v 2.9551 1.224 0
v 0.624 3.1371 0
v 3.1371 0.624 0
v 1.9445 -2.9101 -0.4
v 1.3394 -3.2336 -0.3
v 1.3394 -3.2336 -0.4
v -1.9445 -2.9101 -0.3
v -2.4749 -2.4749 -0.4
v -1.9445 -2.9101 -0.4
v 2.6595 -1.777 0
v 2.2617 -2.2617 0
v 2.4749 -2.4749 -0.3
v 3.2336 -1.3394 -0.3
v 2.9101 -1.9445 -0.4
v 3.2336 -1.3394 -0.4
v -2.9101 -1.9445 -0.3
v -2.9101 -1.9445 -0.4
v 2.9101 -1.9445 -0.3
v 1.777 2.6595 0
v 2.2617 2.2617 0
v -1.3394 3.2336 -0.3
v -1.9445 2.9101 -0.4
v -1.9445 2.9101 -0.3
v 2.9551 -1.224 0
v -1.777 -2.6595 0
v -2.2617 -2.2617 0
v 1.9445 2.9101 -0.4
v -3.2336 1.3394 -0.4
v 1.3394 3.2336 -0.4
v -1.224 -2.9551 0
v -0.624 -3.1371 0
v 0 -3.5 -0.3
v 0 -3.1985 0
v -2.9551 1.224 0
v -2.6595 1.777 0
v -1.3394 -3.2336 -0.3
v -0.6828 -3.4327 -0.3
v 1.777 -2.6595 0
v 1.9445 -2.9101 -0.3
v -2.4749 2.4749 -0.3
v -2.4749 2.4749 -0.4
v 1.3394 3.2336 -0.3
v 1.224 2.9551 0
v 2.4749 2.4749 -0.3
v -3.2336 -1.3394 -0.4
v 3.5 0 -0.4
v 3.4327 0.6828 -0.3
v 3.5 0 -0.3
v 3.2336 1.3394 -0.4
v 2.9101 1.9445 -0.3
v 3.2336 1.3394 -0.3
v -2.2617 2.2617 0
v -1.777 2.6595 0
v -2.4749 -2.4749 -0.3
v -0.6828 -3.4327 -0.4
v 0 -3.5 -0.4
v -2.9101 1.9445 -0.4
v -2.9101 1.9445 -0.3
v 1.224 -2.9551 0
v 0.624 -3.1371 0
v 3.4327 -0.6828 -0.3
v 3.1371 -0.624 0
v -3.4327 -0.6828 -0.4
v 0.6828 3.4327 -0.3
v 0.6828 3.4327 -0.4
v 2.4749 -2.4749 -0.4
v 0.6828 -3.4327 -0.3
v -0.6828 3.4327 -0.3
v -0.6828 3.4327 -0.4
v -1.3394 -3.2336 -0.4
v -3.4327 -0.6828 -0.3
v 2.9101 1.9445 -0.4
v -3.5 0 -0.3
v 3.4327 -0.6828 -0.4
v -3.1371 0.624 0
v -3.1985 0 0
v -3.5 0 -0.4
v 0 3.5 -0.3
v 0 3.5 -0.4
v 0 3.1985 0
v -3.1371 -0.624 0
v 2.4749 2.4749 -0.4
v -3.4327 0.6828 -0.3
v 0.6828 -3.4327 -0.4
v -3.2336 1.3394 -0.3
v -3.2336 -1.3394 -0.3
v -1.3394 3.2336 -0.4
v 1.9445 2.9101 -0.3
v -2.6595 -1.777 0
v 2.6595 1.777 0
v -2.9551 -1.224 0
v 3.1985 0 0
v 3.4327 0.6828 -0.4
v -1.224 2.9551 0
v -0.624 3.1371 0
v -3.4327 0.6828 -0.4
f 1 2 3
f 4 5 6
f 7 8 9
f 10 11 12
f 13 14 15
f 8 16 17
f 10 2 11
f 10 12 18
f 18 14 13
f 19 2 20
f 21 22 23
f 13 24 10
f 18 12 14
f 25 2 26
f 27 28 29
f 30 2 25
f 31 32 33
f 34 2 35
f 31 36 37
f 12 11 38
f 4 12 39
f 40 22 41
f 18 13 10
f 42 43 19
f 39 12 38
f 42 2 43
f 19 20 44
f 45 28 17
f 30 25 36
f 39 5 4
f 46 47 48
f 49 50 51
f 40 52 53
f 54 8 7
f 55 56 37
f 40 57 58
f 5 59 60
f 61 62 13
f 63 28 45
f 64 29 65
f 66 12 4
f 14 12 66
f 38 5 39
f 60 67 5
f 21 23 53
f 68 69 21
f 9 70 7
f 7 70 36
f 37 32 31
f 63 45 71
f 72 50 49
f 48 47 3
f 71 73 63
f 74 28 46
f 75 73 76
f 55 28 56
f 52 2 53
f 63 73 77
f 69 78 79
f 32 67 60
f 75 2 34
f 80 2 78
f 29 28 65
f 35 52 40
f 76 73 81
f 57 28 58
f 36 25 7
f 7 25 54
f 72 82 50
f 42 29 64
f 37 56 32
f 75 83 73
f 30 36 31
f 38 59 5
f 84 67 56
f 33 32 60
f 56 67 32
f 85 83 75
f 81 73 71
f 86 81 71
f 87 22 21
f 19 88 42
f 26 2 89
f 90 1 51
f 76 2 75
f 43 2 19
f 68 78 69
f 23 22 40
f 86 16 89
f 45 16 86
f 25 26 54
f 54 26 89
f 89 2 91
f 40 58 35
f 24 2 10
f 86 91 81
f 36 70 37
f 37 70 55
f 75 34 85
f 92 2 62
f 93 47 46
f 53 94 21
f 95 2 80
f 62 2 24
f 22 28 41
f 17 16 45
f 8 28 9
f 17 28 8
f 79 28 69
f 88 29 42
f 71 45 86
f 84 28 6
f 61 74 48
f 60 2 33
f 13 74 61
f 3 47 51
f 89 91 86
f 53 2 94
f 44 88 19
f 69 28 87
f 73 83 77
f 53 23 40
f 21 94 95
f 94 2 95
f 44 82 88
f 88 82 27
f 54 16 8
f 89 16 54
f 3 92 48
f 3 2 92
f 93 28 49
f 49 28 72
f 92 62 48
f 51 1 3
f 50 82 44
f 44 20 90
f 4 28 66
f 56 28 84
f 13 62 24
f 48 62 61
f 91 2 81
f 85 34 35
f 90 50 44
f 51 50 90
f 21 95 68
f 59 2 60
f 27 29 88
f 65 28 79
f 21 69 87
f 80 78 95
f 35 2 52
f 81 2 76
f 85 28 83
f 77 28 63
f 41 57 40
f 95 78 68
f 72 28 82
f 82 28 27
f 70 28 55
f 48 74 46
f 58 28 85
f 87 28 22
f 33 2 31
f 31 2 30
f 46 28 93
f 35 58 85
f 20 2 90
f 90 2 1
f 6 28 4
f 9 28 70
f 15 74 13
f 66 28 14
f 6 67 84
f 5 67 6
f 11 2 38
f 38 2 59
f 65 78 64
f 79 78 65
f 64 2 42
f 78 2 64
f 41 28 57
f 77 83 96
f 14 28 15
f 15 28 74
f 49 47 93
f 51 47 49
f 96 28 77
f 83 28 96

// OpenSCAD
// LibFile: stemfie.scad 
//   Author: Brendon Collecutt  
//   .
//   Contact: 1976016983@qq.com
//   .
//   This file is part of Stemfie_OpenSCAD.
//   .
//   Stemfie_OpenSCAD is free software: you can redistribute it and/or modify it under the terms of the GNU General Public License as published by the Free Software Foundation, either version 3 of the License, or (at your option) any later version.
//   .
//   Stemfie_OpenSCAD is distributed in the hope that it will be useful, but WITHOUT ANY WARRANTY; without even the implied warranty of MERCHANTABILITY or FITNESS FOR A PARTICULAR PURPOSE. See the GNU General Public License for more details.
//   .
//   You should have received a copy of the GNU General Public License along with Stemfie_OpenSCAD. If not, see <https://www.gnu.org/licenses/>.
//   .
//   Please check https://stemfie.org/license.html for more information or before using stemfie commercially.  
//   .
//   OpenSCAD script for creating Stemife.org parts.  
//   .
//   Feel free to adapt and improve and share your OpenSCAD script (please contact Paulo Kiefe)  
//   .
//   Contact: paulo.kiefe@stemfie.org (https://stemfie.org)
// Includes:
//   include <stemfie.scad>


// Section: Universal constants

// Constant: BU
// Description: Universal voxel block unit (mm) in Stemfie (BlockUnit)
BU = 12.5;

// Constant: HoleRadius
// Description: Universal radius (mm) of the connection hole
HoleRadius = 3.5;

// Constant: FragmentNumber
// Description: Universal tesselation value of curved surfaces
FragmentNumber = 32;

// Constant: Chamfer
// Description: Chamfer size adjustment value for all edges
Chamfer = 0.30;

// Constant: BevelWidth
// Description: Width of the top section of beveled edges. Must be less or equal to 
//   twice printer nozzle diameter to ensure level top surface.
BevelWidth = 0.8;

// Constant: Clearance
// Description: Distance between hole and shafts and
//   other parts that need to move relatively to each other.
Clearance = 0.19;

// Constant: ShaftRadius
// Description: Universal radius (mm) of the connection shaft
ShaftRadius = HoleRadius - Clearance;

// Constant: ShaftFlat
// Description: Universal distance (mm) between two flat sides of the connection shaft.
ShaftFlat = 5;

$fn = FragmentNumber;

// Section: Stemfie Parts
// Subsection: Beams

// Module: beam_block()
// Usage: 
//   beam_block(size, holes);
// Description:
//   Creates a Stemfie beam with holes.
// Arguments:
//   size = Size of block to create in block units.
//   holes = Array of booleans in xyz order for which directions to create holes or a single boolean for all directions.
// Example(3D): Standard Stemfie beam
//   beam_block(3);
// Example(3D): Stemfie beam with vertical holes only.
//   beam_block(3, holes = [false, false, true]);
// Example(3D): Stemfie 3D "beam"
//   beam_block([3, 2, 2]);
module beam_block(size = [4,1,1], holes = [true, true, true])
{
    size = is_list(size)?size:[size,1, 1];
    holes = is_list(holes)?holes:[holes,holes,holes];
    
    faceRotate = [[0,90,0],[90,0,0],[0,0,90]];
    T((size - [1,1,1]) * BU / 2)
    D()
    {
        U()
        {

            D()
            {
                BU_cube(size);
                    Tz(size.z * BU / 2)
                    bevel(offs = -Chamfer * 2 - BevelWidth, neg = true)
                    Sq(size.x * BU, size.y * BU);
            }
            
            hole_grid(size = [size.x, size.y], l = size.z, neg = false);
        }
        
        for(i = [0:2])
        {
            if(holes[i])
            R(faceRotate[i])
                hole_grid(size = [size[(i + 2) % 3], size[(i + 1) % 3]], l = size[i], neg = true);

        }

    }
}

// Module: beam_cross()
// Usage: 
//   beam_cross(lengths);
// Description:
//   Overlaps two Stemfie beams. It can be used to create 'V', 'L', 'T' and 'X' shapes.
// Arguments:
//   lengths = Array of 2, 3 or 4 integers. Lengths extending from intersection block with clockwise ordering.
// Example(3D): 'V' beam
//   beam_cross([3,3]);
// Example(3D): 'L' beam
//   beam_cross([5,3]);
// Example(3D): 'T' beam
//   beam_cross([2,3,2]);
// Example(3D): 'X' beam
//   beam_cross([2,2,2,2]);
module beam_cross(lengths = [2,2,2,2])
{
    cross_helper(len(lengths))
    {
        beam_block([lengths[0] + 1,1,1]);
        if(len(lengths) > 1)
            beam_block([lengths[1] + 1,1,1]);
        if(len(lengths) > 2)
            beam_block([lengths[2] + 1,1,1]);
        if(len(lengths) > 3)
            beam_block([lengths[3] + 1,1,1]);
    }
}

// Subsection: Braces
// Module: brace()
// Usage: 
//   brace(size, <h=>, <holes=>);
// Description:
//   Creates a Stemfie brace with holes.
// Arguments:
//   size = Length of brace to create in block units.
//   h = height of brace
//   holes = Set to false to create blank brace.
// Example(3D): Standard Stemfie brace
//   brace(3);
// Example(3D): Double thickness blank brace
//   brace(3, h = 0.5, holes = false);
module brace(size, h = 0.25, holes = true)
{
    BU_Tx((size-1)/2)
    D()
    {
        U()
        {
            bevel_plate(h)BU_slot(size);
            if(holes)
            hole_grid([size,1],h,false);
        }
        if(holes)
        hole_grid([size,1],h,true);
    }
    
}

// Module: brace_cross()
// Usage: 
//   brace_cross(lengths, <h>);
// Description:
//   Overlaps two Stemfie brace. It can be used to create 'V', 'L', 'T' and 'X' shapes.
// Arguments:
//   lengths = Array of 2, 3 or 4 integers. Lengths extending from intersection block with clockwise ordering.
//   h = Height of brace, default = 0.25BU
// Example(3D): 'V' brace
//   brace_cross([3,3]);
// Example(3D): 'L' brace
//   brace_cross([5,3]);
// Example(3D): 'T' brace
//   brace_cross([2,3,2]);
// Example(3D): Double thickness 'X' brace
//   brace_cross([1, 1, 1, 1], 0.5);
module brace_cross(lengths = [2,2,2,2], h = 0.25)
{
    cross_helper(len(lengths))
    {
        brace(lengths[0] + 1, h);
        if(len(lengths) > 1)
            brace(lengths[1] + 1, h);
        if(len(lengths) > 2)
            brace(lengths[2] + 1, h);
        if(len(lengths) > 3)
            brace(lengths[3] + 1, h);
    }
}

// Section: Helper Modules
// Subsection: General

// Module: hole()
// Usage:
//   hole(l, neg);
// Description:
//   Create a circular standard sized hole with beveled top and bottom.
// Arguments:
//   l = The length of the hole in base units.
//   neg = true to create hole cavity, false to create sleeve and bevel.
// Example(3D):
//   difference()
//   {
//     BU_cube();
//     hole(l = 1, neg = true);
//   }
// Example(3D):
//   hole(l = 1, neg = false);
// Example(3D):
//   difference()
//   {
//     hole(l = 1, neg = false);
//     hole(l = 1, neg = true);
//   }
module hole(l = 1, neg = true)
{
    cutout(l, neg)
        Ci(r = HoleRadius);
}

// Module: cutout()
// Usage:
//   cutout(l, neg);
// Description:
//   Create an irregular sized hole with beveled top and bottom. Children should be a convex 2D shape.
// Arguments:
//   l = The length of the cutout in base units.
//   neg = true to create cutout cavity, false to create sleeve and top bevel.
// Example(3D): Create a brace with a slot down most of the length.
//   difference()
//   {
//     union()
//     {
//       brace(4, holes = false);
//       
//       cutout(l = 0.25, neg = false)
//         BU_Tx(1)
//           hole_slot(l = 3);
//     }
//     cutout(l = 0.25, neg = true)
//       BU_Tx(1)
//         hole_slot(l = 3);
//   }
// Example(3D): Shaft shaped hole in brace.
//   difference()
//   {
//     union()
//     {
//       brace(4, holes = false);
//         cutout(l = 0.25, neg = false)
//           offset(r=Clearance)
//             shaft_profile();
//     }
//     cutout(l = 0.25, neg = true)
//       offset(r=Clearance)
//         shaft_profile();
//   }
module cutout(l = 1, neg = true)
{
    if(neg)
    {
        U()
        {
            LiEx(l * BU + 0.1)
                children();
            MKz()
                BU_Tz(l/2)
                    bevel(0, true)
                        children();
                   
        }
    }
    else
    {
        Tz(-Chamfer / 2)
        LiEx(h = l * BU - Chamfer)
            offset(Chamfer * 2 + BevelWidth)children();
        BU_Tz(l/2)
            bevel(Chamfer * 2 + BevelWidth, false)
                children();
            
    }
}

// Module: hole_grid()
// Usage:
//   hole_grid(size, <l=1>, <neg=true>);
// Description:
//   Creates a rectangular array of holes centered on the origin with block unit spacing.
// Arguments:
//   size = List with number of holes in X and Y directions.
//   l = See {{hole()}}
//   neg = See {{hole()}}
// Example(3D): Create a 4x5 block with vertical holes.
//   difference()
//   {
//     BU_cube([4,5,1]);
//     hole_grid([4,5]);
//   }
// Example(3D): Create a 4x5x0.25 block unit plate with holes.
//   difference()
//   {
//     union()
//     {
//       bevel_plate(h = 0.25)
//         offset(r = BU/2)
//           square([3 * BU, 4 * BU], center = true);
//       hole_grid([4,5], l = 0.25, neg = false);
//     }
//     hole_grid([4,5], l = 0.25);
//   }
module hole_grid(size = [1,1], l = 1, neg = true)
{
    forXY(N = size.x, M = size.y, dx = BU, dy = BU)
        hole(l = l, neg = neg);
}

// Module: hole_list()
// Usage:
//   hole_list(list, <l=1>, <neg=true>);
// Description:
//   Creates a rectangular array of holes centered on the origin with block unit spacing.
// Arguments:
//   list = List with location of holes by X,Y co-ordinates in block units.
//   l = See {{hole()}}
//   neg = See {{hole()}}
// Example(3D): Create brace with custom hole locations
//   difference()
//   {
//     union()
//     {
//       brace(5, holes = false);
//       hole_list([[0,0],[4,0]], l = 0.25, neg = false);
//     }
//     hole_list([[0,0],[4,0]], l = 0.25);
//   }
module hole_list(list = [[0,0]], l = 1, neg = true)
{
    for(i = list)
        BU_T(i.x, i.y, 0)
            hole(l = l, neg = neg);
}


// Module: hole_slot()
// Usage:
//   hole_slot(l);
// Description:
//   Create a 2D slot profile with radius equal to {{HoleRadius}} and length l.
// Arguments:
//   l = Length of slot in block units.
// Example(2D):
//   hole_slot(2);
module hole_slot(l)
{
    slot(l, HoleRadius);
}

// Module: BU_slot()
// Usage:
//   BU_slot(l);
// Description:
//   Create a 2D slot profile with radius {{BU}}/2
// Arguments:
//   l = Length of slot in block units.
// Example(2D):
//   BU_slot(2);
module BU_slot(l)
{
    slot(l, BU/2);
}

// Module: slot()
// Usage:
//   slot(l, r);
// Description:
//   Create a 2D slot profile.
// Arguments:
//   l = Length of slot in block units.
// Example(2D):
//   slot(2, r = 2 + Clearance);
module slot(l, r = BU/2)
{
    hull()
    {
        MKx()
            BU_Tx(l / 2 - 1 / 2)
                Ci(r = r);
    }
}

//Module: bevel
//Example(3D):
bevel(neg = false)
  circle(r = HoleRadius);
module bevel(offs = 0, neg = true)
{
    offs = offs + (neg?Chamfer:0);
    Tz(neg?0:-Chamfer)
    Sz(neg?-1:1)
    hull()
    {
        Tz(-0.05)
            LiEx(0.1)
                offset(offs)
                children();
        
        Tz(Chamfer / 2)
        LiEx(Chamfer)
                offset(offs - Chamfer)
                children();
    }
}

module bevel_plate(h = 0.25)
{
    D()
    {
        hull()
        {
            LiEx(BU * h - Chamfer * 2)children();
            LiEx(BU * h)offset(r = -Chamfer)children();
        }

        Tz(BU * h / 2)
            bevel(-Chamfer * 2 - BevelWidth, true)children();

    }
}

module cross_helper(num = 4)
{
    for(i = [0: min(3, num - 1)])
    {
        Rz(-90 * i)
        D()
        {
            children(i);
            if(num > 1)
            {
                if(num != 2 || i != 1)
                    Rz(num == 3 && i == 2?0:45)BU_Tx(-1)Cu(BU * 2);
                if(num != 2 || i != 0)
                    Rz(num == 3 && i == 0?0:-45)BU_Tx(-1)Cu(BU * 2);
            }
        }
    }

}
// Subsection: Shafts

// Module: shaft_profile()
// Usage:
//   shaft_profile();
// Description:
//   Creates a stemfie 2D profile for creating shafts and screws.
// Example(2D):
//   shaft_profile();
module shaft_profile()
{
    I()
    {
        Ci(r = ShaftRadius);
        Sq(ShaftFlat, ShaftRadius * 3);
    }
}

// Module: shaft_head_profile()
// Usage: 
//   shaft_head_profile()
// Description:
//   Creates a stemfie 2D profile for creating shafts and screw heads.
// Example(2D):
//   shaft_head_profile();
module shaft_head_profile()
{
    offset(r = 1)
    offset(-1)
    I()
    {
        Tx(-1)
        Ci(r = BU/2);
        BU_Tx(1/2)
        Sq(BU);
    }
}

// Module: shaft_head()
// Usage: 
//   shaft_head()
// Description:
//   Creats a stemfie shaft or screw head for creating shafts and screws.
// Example():
//   shaft_head();
module shaft_head()
{
    hull()
    {
        LiEx(ShaftFlat - Chamfer * 2)
            shaft_head_profile();
        LiEx(ShaftFlat)offset(-Chamfer)
            shaft_head_profile();
    }
    Ry(90)
    LiEx(Chamfer * 2, C = false)
    shaft_profile();
}

// Module: shaft()
// Usage:
//   shaft(l, beveled_ends)
// Description:
//   Creates a stemfie blank shaft for creating shafts and screws.
// Arguments:
//   l = The length of the shaft in base units.
//   beveled_ends = Bevel ends of shaft using the global {{Chamfer}} setting.
// Example(3D): Shaft with beveled ends
//   shaft(4, true);
// Example(3D): Shaft without beveled ends
//   shaft(4, false);
module shaft(l = 1, beveled_ends = true)
{
    Ry(90)
    D()
    {
        U()
        {
            LiEx(l * BU - (beveled_ends?Chamfer * 2:0))
            {
                shaft_profile();
            }
            
            if(beveled_ends)
            MKz()
            Tz(l * BU / 2)
                bevel(neg = false)
                    shaft_profile();
        }
    }
}

// Subsection: Braces
module brace_cross_section(h = 0.25)
{
    
    D()
    {
        hull()
        {
            Sq(BU,h*BU - Chamfer*2);
            Sq(BU - Chamfer*2, h*BU);
        }
        
        
        hull()
        {
            Ty(h*BU/2 + 0.1)
                Sq(BU - Chamfer * 2 - BevelWidth*2, 0.2);
            Ty(h*BU/2)
                Sq(BU - Chamfer * 4 - BevelWidth*2, Chamfer * 2);
        }
    }
}

module brace_arc(r, angle, h = 0.25, holes = 2)
{
    //If the remaining angle leaves a distance less than 1BU increase the angle to 360.
    angle = ((1 - min(angle, 360)/360) * r * PI * 2 < 1)?360:min(angle, 360);
    
    //Reduce the number of holes if necessary to ensure spacing is always greater than 1BU.
    holes = min(floor(angle/180 * PI * r) + 1, holes);
    D()
    {
        U()
        {
            if(angle < 360)
            for(i=[0, 1])
            {
                Rz(i * angle)
                BU_Tx(r)
                Rz(i * 180)
                I()
                {
                    bevel_plate(h = h)
                        Ci(BU/2);
                    BU_Ty(-1/2)
                        Cu(BU+1, BU, BU * h + 1);
                }
            }
            
            if(holes > 0)
                for(n = [0:holes - 1])
                    Rz(n * angle / (holes-(angle == 360?0:1)))
                        BU_Tx(r)
                        hole(l = 0.25, neg = false);
            
            rotate_extrude(angle=angle, convexity = 8, $fn = FragmentNumber * r * 2)
               BU_Tx(r)
                 brace_cross_section(h = h);
        }
        
        if(holes > 0)
                for(n = [0:holes - 1])
                    Rz(n * angle / (holes-(angle == 360?0:1)))
                        BU_Tx(r)
                        hole(l = 0.25, neg = true);
        
        
    }

            
}


// Subsection: Beams

// Module: BU_cube()
// Usage:
//   BU_cube(size = [1,1,1]);
// Description:
//   Create a beveled cube of given size in block units.
// Arguments:
//   BU_cube = Size of cube
// Example(3D):
//   BU_cube();
// Example(3D):
//   BU_cube([3,1,1]);
module BU_cube(size = [1,1,1])
{
    D()
    {
        hull()
            for(i = [[0, 1, 1],[1, 0, 1],[1, 1, 0]])
                Cu(size * BU - i * Chamfer*2);
    }
}

// Subsection: Block Unit Translation Shortcuts
//   Modified from Rudolf Huttary's [shortcuts.scad](https://www.thingiverse.com/thing:644830)

// Module: BU_T();
// Usage:
//   BU_T(x, y, z);
//   BU_T([x, y, z]);
// Description:
//   Shortcut for translate([x * BU, y * BU, z * BU])
module BU_T(x=0, y=0, z=0){
  translate(x[0]==undef?[x, y, z]* BU:x * BU)children(); }

// Module: BU_TK()
// Usage:
//   BU_TK(x, y, z);
//   BU_TK([x, y, z]);
// Description:
//   Children at origin and translation.
// Example(3D): One block unit cube centered at origin and one at [3 * BU, 0, 0]
//   BU_TK(3, 0 , 0) BU_cube();
module BU_TK(x=0, y=0, z=0){ children(); BU_T(x, y, z) children(); }

// Module: BU_Tx()
// Usage: BU_Tx(x)
// Description:
//   Shortcut for translate([x * BU, 0, 0])
module BU_Tx(x) { translate([x * BU, 0, 0])children(); }

// Module: BU_Ty()
// Usage: BU_Ty(y)
// Description:
//   Shortcut for translate([0, y * BU, 0])
module BU_Ty(y) { translate([0, y * BU, 0])children(); }

// Module: BU_Tz()
// Usage: BU_Tz(z)
// Description:
//   Shortcut for translate([0, 0, z * BU])
module BU_Tz(z) { translate([0, 0, z * BU])children(); }

// Module: BU_TKx()
// Usage: BU_TKx(x)
// Description:
//   Alternative for BU_TK(x=x)
module BU_TKx(x) { BU_TK(x=x) children(); }

// Module: BU_TKy()
// Usage: BU_TKy(z)
// Description:
//   Alternative for BU_TK(y=y)
module BU_TKy(y) { BU_TK(y=y) children(); }

// Module: BU_TKz()
// Usage: BU_TKz(z)
// Description:
//   Alternative for BU_TK(z=z)
module BU_TKz(z) { BU_TK(z=z) children(); }


/// https://www.thingiverse.com/thing:644830
/// ShortCuts.scad 
/// Author: Rudolf Huttary, Berlin 2015
/// Update: Dario Pellegrini, Padova (IT) 2019/8
///

/// Euclidean Transformations

module T(x=0, y=0, z=0){
  translate(x[0]==undef?[x, y, z]:x)children(); }
module TK(x=0, y=0, z=0){ children(); T(x,y,z) children(); }
  
module Tx(x) { translate([x, 0, 0])children(); }
module Ty(y) { translate([0, y, 0])children(); }
module Tz(z) { translate([0, 0, z])children(); }
module TKx(x) { TK(x=x) children(); }
module TKy(y) { TK(y=y) children(); }
module TKz(z) { TK(z=z) children(); }

module R(x=0, y=0, z=0) rotate( is_list(x)? x : [x, y, z]) children();
module Rx(x=90) for(i=(is_list(x)?x:[x])) R([i, 0, 0]) children();
module Ry(y=90) for(i=(is_list(y)?y:[y])) R([0, i, 0]) children();
module Rz(z=90) for(i=(is_list(z)?z:[z])) R([0, 0, i]) children();
module M(x=0, y=0, z=0) mirror( is_list(x)? x : [x, y, z]) children(); 
module Mx() M([1, 0, 0]) children(); 
module My() M([0, 1, 0]) children(); 
module Mz() M([0, 0, 1]) children(); 

module RK(x=0, y=0, z=0){children(); rotate( is_list(x)? x : [x, y, z]) children();}
module RKx(x=90) Rx(concat(0,x)) children();
module RKy(y=90) Ry(concat(0,y)) children();
module RKz(z=90) Rz(concat(0,z)) children();
module MK(x=0, y=0, z=0) {children(); mirror( is_list(x)? x : [x, y, z]) children();} 
module MKx() MK([1, 0, 0]) children(); 
module MKy() MK([0, 1, 0]) children(); 
module MKz() MK([0, 0, 1]) children(); 

module S(x=1, y=undef, z=undef){ scale(x[0]==undef?[x, y?y:x, z?z:y?1:x]:x) children();}
module Sx(x=1){scale([x, 1, 1]) children();}
module Sy(y=1){scale([1, y, 1]) children();}
module Sz(z=1){scale([1, 1, z]) children();}

module Skew(x=0, y=0, z=0, a=0, b=0, c=0)
  multmatrix([[1, a, x], [b, 1, y], [z, c, 1]]) children(); 
module skew(x=0, y=0, z=0, a=0, b=0, c=0) 
  Skew(x, y, z, a, b, c) children();
module SkX(x=0) Skew(x=x) children();
module SkY(y=0) Skew(y=y) children();
module SkZ(z=0) Skew(z=z) children();
module SkewX(x=0) Skew(x=x) children();
module SkewY(y=0) Skew(y=y) children();
module SkewZ(z=0) Skew(z=z) children();

module LiEx(h=1, tw = 0, sl = 20, sc = 1, C=true) linear_extrude(height=h, twist = tw, slices = sl, scale = sc, center=C) children();

// Booleans
module D() if($children >1) difference(){children(0); children([1:$children-1]);} else children(); 
module U() children([0:$children-1]);
module I() intersection_for(n=[0:$children-1]) children(n); 

// rotates N instances of children around z axis
module rotN(r=10, N=4, offs=0, M=undef) for($i=[0:(M?M-1:N-1)])  rotate([0,0,offs+$i*360/N])  translate([r,0,0]) children();
module forN(r=10, N=4, offs=0, M=undef) rotN(r, N, offs, M) children();
module forX(dx = 10, N=4) for(i=[0:N-1]) T(-((N-1)/2-i)*dx) children(); 
module forY(dy = 10, M=4) for(i=[0:M-1]) Ty(-((M-1)/2-i)*dy) children(); 
module forZ(dz = 10, M=4) for(i=[0:M-1]) Tz(-((M-1)/2-i)*dz) children(); 
module forXY(dx = 10, N=4, dy = 10, M=4) forX(dx, N) forY(dy, M) children(); 


// primitives - 2D

module Sq(x =10, y = undef, center = true)
{
		square([x, y?y:x], center = center); 
}
module Ci(r = 10, d=undef) circle(d?d/2:r); 

// derived primitives - 2d
module CiH(r = 10, w = 0, d=undef)
  circle_half(r, w, d); 

module CiS(r = 10, w1 = 0, w2 = 90, d=undef)
  circle_sector(r, w1, w2, d); 


// primitives - 3d
module Cy(r = undef, h = 1, C = true, r1 = undef, r2=undef, d=undef, d1=undef, d2=undef)
  cylinder(r=d?d/2:r, h=h, center=C, r1=d1?d1/2:r1, r2=d2?d2/2:r2); 

module Cu(x = 10, y = undef, z = undef, C = true)
  cube(x[0] == undef?[x, y?y:x, y?z?z:1:x]:x, center=C); 

module CuR(x = 10, y = undef, z = undef, r = 0, C = true)
  cube_rounded(x[0] == undef?[x, y?y:x, y?z?z:1:x]:x, r=r, center=C); 

module CyR(r = 10, h=10, r_=1, d = undef, r1=undef, r2=undef, d1 = undef, d2 = undef, C=false)  
  cylinder_rounded(r, h, r, d, r1, r2, d1, d2, C); 

// derived primitives - 3d
module CyH(r = 10, h = 1, w = 0, C = true, r1 = undef, r2=undef, d=undef, d1=undef, d2=undef)
  Rz(w) cylinder_half(r=r, h=h, center=C, r1=r1, r2=r2, d=d, d1=d1, d2=d2); 

module CyS(r = 10, h = 1, w1 = 0, w2 = 90, C = true, r1 = undef, r2=undef, d=undef, d1=undef, d2=undef)
  cylinder_sector(r=r, h=h, w1=w1, w2=w2, center=C, r1=r1, r2=r2, d=d, d1=d1, d2=d2); 

module Ri(R = 10, r = 5, h = 1, C = true, D=undef, d=undef)
  ring(R, r, h, C, D, d); 

module RiS(R = 10, r = 5, h = 1, w1 = 0, w2 = 90, C = true, D=undef, d=undef)
   ring_sector(R, r, h, w1, w2, C, D, d); 

module RiH(R = 10, r=5, h = 1, w = 0, C = true, D=undef, d=undef)
   ring_half(R, r, h, w, C, D, d); 
module Pie(r = 10, h = 1, w1 = 0, w2 = 90, C = true, d=undef)
  cylinder_sector(r, h, w1, w2, C, d);  
module Sp(r = 10)
  sphere(r); 
module SpH(r = 10, w1 = 0, w2 = 0)
  sphere_half(r, w1, w2); 
module To(R=10, r=1, r1 = undef, w=0, w1=0, w2=360) torus(R=R, r=r, r1=r1, w=w,w1=w1, w2=w2);  

module Col(r=1, g=1, b=1, t=1) 
{
  if(len(r)) 
    color(r, g) children(); 
  else
    color([r,g,b], t) children(); 
}

function Rg(N=10) = [for(i=[0:N-1]) i]; 

//


// clear text definitions

module cube_rounded(size, r=0, center=false)
{
  sz = size[0]==undef?[size, size, size]:size; 
  ce = center[0]==undef?[center, center, center]:center; 
  r_ = min(abs(r), abs(size.x/2), abs(size.y/2), abs(size.z/2)); 
  translate([ce.x?-sz.x/2:0,ce.y?-sz.y/2:0, ce.z?-sz.z/2:0])
  if(r)
    hull() 
    {
      translate([r_, r_, r_]) sphere(r_); 
      translate([r_, r_, sz.z-r_]) sphere(r_); 
      translate([r_, sz.y-r_, r_]) sphere(r_); 
      translate([r_, sz.y-r_, sz.z-r_]) sphere(r_); 
      translate([sz.x-r_, r_, r_]) sphere(r_); 
      translate([sz.x-r_, r_, sz.z-r_]) sphere(r_); 
      translate([sz.x-r_, sz.y-r_, r_]) sphere(r_); 
      translate([sz.x-r_, sz.y-r_, sz.z-r_]) sphere(r_); 
    }
  else 
    cube(size); 
}

module circle_half(r = 10, w = 0, d = undef)
{
  R= d?d/2:r;
	difference()
	{
		circle(R); 
     rotate([0, 0, w-90])
     translate([0, -R])
		square([R, 2*R], center = false); 
	}
}

module circle_sector(r = 10, w1 = 0, w2 = 90, d = undef)
{
  R = d?d/2:r; 
  W2 = (w1>w2)?w2+360:w2; 
  diff = abs(W2-w1);
  if (diff < 180)
    intersection()
		{
       circle_half(R, w1); 
       circle_half(R, W2-180); 
 		}
	else if(diff>=360)
    circle(R); 
  else
		{
       circle_half(R, w1); 
       circle_half(R, W2-180); 
 		}
}

module cylinder_half(r = 10, h = 1, center = true, r1 = undef, r2=undef, d=undef, d1=undef, d2=undef)
{
  R = max(d?d/2:r, r1?r1:0, r2?r2:0, d1?d1/2:0, d2?d2/2:0);
  difference()
  {
    Cy(r=r, h=h, C=center, r1=r1, r2=r2, d=d, d1=d1, d2=d2);
    Ty(-(R+1)/2)
    Cu(2*R+1, R+1, h+1, C = center); 
  }
//  linear_extrude(height = h, center = center)
//  circle_half(r=r, w=w, d=d); 
} 

module cylinder_sector(r = 10, h = 1, w1 = 0, w2 = 90, center = true, r1 = undef, r2=undef, d=undef, d1=undef, d2=undef)
{
  R = max(d?d/2:r, r1?r1:0, r2?r2:0, d1?d1/2:0, d2?d2/2:0);
    intersection()
    {
      Cy(r=r, h=h, C=center, r1=r1, r2=r2, d=d, d1=d1, d2=d2);
      cylinder_sector_(r=R, h=h, w1=w1, w2=w2, center=center);
    }
}

module cylinder_sector_(r = 10, h = 1, w1 = 0, w2 = 90, center = true)
  linear_extrude(height = h, center = center, convexity = 2)
  circle_sector(r=r, w1=w1, w2=w2); 

module cylinder_rounded(r=10, h=10, r_=1, d=undef, r1=undef, r2=undef, d1=undef, d2=undef, center=true)
{
  r1 = r1==undef?d1==undef?d==undef?r:d/2:d1/2:r1;
  r2 = r2==undef?d2==undef?d==undef?r:d/2:d2/2:r2;
  r_ = min(abs(h/4), abs(r1), abs(r2), abs(r_));
  h = abs(h);
  Tz(center?-h/2:0) rotate_extrude() I()
  {
    offset(r_)offset(-r_) polygon([[-2*r_,0], [r1, 0], [r2, h], [0,h], [-2*r_,h]] );
    Sq(max(r1,r2), h, 0);
  }
} 


module ring(R = 10, r = 5, h = 1, center = true, D=undef, d=undef)
  linear_extrude(height = h, center = center, convexity = 2)
	difference()
	{
    Ci(r = D?D/2:R); 
    Ci(r = d?d/2:r); 
	}


module ring_half(R = 10, r = 5, h = 1, w = 0, center = true, D=undef, d=undef)
  linear_extrude(height = h, center = center, convexity = 2)
  Rz(w)
	difference()
	{
    CiH(r = D?D/2:R); 
    Ci(r = d?d/2:r); 
	}

module ring_sector(R = 10, r = 5, h = 1, w1 = 0, w2 = 90, center = true, D=undef, d=undef)
  linear_extrude(height = h, center = center, convexity = 2)
	difference()
	{
    CiS(r = D?D/2:R, w1 = w1, w2 = w2); 
    Ci(r = d?d/2:r); 
	}


module sphere_half(r = 10, w1 = 0, w2 = 0)
  R(w1, w2)
	intersection() {
   	sphere(r);
    Tz(r) Cu(2*r); 
	}

module torus(R=10, r=1, r1 = undef, w=0, w1=0, w2=360)
{
  if (r1)
    D(){
      To(R=R, r=r, w=w, w1=w1, w2=w2); 
      To(R=R, r=r1, w=w, w1=w1-1, w2=w2+1); 
    }
  else
    Rz(w1)
    rotate_extrude(angle = w2-w1)
    T(R)
    Rz(w)
    circle(r); 
    
}

// additional code
module place_in_rect(dx =20, dy=20)
{
  cols = ceil(sqrt($children)); 
  rows = floor(sqrt($children)); 
  for(i = [0:$children-1])
	{ 
	  T(dx*(-cols/2+(i%cols)+.5), dy*(rows/2-floor(i/cols)-.5))
		 children(i); 
	}
}

module measure(s=10, x=undef, y=undef, z=undef)
{
  p=[[s, s, 0], [-s, s, 0], [-s, -s, 0], [s, -s, 0]]; 
  C("black",.5)
  {
    if(z) Tz(z) polyhedron(p, [[0,1,2,3]]); 
    if(x) Tx(x) Ry(90)polyhedron(p, [[0,1,2,3]]); 
    if(y) Ty(y) Rx(90) polyhedron(p, [[0,1,2,3]]); 
  }
}
